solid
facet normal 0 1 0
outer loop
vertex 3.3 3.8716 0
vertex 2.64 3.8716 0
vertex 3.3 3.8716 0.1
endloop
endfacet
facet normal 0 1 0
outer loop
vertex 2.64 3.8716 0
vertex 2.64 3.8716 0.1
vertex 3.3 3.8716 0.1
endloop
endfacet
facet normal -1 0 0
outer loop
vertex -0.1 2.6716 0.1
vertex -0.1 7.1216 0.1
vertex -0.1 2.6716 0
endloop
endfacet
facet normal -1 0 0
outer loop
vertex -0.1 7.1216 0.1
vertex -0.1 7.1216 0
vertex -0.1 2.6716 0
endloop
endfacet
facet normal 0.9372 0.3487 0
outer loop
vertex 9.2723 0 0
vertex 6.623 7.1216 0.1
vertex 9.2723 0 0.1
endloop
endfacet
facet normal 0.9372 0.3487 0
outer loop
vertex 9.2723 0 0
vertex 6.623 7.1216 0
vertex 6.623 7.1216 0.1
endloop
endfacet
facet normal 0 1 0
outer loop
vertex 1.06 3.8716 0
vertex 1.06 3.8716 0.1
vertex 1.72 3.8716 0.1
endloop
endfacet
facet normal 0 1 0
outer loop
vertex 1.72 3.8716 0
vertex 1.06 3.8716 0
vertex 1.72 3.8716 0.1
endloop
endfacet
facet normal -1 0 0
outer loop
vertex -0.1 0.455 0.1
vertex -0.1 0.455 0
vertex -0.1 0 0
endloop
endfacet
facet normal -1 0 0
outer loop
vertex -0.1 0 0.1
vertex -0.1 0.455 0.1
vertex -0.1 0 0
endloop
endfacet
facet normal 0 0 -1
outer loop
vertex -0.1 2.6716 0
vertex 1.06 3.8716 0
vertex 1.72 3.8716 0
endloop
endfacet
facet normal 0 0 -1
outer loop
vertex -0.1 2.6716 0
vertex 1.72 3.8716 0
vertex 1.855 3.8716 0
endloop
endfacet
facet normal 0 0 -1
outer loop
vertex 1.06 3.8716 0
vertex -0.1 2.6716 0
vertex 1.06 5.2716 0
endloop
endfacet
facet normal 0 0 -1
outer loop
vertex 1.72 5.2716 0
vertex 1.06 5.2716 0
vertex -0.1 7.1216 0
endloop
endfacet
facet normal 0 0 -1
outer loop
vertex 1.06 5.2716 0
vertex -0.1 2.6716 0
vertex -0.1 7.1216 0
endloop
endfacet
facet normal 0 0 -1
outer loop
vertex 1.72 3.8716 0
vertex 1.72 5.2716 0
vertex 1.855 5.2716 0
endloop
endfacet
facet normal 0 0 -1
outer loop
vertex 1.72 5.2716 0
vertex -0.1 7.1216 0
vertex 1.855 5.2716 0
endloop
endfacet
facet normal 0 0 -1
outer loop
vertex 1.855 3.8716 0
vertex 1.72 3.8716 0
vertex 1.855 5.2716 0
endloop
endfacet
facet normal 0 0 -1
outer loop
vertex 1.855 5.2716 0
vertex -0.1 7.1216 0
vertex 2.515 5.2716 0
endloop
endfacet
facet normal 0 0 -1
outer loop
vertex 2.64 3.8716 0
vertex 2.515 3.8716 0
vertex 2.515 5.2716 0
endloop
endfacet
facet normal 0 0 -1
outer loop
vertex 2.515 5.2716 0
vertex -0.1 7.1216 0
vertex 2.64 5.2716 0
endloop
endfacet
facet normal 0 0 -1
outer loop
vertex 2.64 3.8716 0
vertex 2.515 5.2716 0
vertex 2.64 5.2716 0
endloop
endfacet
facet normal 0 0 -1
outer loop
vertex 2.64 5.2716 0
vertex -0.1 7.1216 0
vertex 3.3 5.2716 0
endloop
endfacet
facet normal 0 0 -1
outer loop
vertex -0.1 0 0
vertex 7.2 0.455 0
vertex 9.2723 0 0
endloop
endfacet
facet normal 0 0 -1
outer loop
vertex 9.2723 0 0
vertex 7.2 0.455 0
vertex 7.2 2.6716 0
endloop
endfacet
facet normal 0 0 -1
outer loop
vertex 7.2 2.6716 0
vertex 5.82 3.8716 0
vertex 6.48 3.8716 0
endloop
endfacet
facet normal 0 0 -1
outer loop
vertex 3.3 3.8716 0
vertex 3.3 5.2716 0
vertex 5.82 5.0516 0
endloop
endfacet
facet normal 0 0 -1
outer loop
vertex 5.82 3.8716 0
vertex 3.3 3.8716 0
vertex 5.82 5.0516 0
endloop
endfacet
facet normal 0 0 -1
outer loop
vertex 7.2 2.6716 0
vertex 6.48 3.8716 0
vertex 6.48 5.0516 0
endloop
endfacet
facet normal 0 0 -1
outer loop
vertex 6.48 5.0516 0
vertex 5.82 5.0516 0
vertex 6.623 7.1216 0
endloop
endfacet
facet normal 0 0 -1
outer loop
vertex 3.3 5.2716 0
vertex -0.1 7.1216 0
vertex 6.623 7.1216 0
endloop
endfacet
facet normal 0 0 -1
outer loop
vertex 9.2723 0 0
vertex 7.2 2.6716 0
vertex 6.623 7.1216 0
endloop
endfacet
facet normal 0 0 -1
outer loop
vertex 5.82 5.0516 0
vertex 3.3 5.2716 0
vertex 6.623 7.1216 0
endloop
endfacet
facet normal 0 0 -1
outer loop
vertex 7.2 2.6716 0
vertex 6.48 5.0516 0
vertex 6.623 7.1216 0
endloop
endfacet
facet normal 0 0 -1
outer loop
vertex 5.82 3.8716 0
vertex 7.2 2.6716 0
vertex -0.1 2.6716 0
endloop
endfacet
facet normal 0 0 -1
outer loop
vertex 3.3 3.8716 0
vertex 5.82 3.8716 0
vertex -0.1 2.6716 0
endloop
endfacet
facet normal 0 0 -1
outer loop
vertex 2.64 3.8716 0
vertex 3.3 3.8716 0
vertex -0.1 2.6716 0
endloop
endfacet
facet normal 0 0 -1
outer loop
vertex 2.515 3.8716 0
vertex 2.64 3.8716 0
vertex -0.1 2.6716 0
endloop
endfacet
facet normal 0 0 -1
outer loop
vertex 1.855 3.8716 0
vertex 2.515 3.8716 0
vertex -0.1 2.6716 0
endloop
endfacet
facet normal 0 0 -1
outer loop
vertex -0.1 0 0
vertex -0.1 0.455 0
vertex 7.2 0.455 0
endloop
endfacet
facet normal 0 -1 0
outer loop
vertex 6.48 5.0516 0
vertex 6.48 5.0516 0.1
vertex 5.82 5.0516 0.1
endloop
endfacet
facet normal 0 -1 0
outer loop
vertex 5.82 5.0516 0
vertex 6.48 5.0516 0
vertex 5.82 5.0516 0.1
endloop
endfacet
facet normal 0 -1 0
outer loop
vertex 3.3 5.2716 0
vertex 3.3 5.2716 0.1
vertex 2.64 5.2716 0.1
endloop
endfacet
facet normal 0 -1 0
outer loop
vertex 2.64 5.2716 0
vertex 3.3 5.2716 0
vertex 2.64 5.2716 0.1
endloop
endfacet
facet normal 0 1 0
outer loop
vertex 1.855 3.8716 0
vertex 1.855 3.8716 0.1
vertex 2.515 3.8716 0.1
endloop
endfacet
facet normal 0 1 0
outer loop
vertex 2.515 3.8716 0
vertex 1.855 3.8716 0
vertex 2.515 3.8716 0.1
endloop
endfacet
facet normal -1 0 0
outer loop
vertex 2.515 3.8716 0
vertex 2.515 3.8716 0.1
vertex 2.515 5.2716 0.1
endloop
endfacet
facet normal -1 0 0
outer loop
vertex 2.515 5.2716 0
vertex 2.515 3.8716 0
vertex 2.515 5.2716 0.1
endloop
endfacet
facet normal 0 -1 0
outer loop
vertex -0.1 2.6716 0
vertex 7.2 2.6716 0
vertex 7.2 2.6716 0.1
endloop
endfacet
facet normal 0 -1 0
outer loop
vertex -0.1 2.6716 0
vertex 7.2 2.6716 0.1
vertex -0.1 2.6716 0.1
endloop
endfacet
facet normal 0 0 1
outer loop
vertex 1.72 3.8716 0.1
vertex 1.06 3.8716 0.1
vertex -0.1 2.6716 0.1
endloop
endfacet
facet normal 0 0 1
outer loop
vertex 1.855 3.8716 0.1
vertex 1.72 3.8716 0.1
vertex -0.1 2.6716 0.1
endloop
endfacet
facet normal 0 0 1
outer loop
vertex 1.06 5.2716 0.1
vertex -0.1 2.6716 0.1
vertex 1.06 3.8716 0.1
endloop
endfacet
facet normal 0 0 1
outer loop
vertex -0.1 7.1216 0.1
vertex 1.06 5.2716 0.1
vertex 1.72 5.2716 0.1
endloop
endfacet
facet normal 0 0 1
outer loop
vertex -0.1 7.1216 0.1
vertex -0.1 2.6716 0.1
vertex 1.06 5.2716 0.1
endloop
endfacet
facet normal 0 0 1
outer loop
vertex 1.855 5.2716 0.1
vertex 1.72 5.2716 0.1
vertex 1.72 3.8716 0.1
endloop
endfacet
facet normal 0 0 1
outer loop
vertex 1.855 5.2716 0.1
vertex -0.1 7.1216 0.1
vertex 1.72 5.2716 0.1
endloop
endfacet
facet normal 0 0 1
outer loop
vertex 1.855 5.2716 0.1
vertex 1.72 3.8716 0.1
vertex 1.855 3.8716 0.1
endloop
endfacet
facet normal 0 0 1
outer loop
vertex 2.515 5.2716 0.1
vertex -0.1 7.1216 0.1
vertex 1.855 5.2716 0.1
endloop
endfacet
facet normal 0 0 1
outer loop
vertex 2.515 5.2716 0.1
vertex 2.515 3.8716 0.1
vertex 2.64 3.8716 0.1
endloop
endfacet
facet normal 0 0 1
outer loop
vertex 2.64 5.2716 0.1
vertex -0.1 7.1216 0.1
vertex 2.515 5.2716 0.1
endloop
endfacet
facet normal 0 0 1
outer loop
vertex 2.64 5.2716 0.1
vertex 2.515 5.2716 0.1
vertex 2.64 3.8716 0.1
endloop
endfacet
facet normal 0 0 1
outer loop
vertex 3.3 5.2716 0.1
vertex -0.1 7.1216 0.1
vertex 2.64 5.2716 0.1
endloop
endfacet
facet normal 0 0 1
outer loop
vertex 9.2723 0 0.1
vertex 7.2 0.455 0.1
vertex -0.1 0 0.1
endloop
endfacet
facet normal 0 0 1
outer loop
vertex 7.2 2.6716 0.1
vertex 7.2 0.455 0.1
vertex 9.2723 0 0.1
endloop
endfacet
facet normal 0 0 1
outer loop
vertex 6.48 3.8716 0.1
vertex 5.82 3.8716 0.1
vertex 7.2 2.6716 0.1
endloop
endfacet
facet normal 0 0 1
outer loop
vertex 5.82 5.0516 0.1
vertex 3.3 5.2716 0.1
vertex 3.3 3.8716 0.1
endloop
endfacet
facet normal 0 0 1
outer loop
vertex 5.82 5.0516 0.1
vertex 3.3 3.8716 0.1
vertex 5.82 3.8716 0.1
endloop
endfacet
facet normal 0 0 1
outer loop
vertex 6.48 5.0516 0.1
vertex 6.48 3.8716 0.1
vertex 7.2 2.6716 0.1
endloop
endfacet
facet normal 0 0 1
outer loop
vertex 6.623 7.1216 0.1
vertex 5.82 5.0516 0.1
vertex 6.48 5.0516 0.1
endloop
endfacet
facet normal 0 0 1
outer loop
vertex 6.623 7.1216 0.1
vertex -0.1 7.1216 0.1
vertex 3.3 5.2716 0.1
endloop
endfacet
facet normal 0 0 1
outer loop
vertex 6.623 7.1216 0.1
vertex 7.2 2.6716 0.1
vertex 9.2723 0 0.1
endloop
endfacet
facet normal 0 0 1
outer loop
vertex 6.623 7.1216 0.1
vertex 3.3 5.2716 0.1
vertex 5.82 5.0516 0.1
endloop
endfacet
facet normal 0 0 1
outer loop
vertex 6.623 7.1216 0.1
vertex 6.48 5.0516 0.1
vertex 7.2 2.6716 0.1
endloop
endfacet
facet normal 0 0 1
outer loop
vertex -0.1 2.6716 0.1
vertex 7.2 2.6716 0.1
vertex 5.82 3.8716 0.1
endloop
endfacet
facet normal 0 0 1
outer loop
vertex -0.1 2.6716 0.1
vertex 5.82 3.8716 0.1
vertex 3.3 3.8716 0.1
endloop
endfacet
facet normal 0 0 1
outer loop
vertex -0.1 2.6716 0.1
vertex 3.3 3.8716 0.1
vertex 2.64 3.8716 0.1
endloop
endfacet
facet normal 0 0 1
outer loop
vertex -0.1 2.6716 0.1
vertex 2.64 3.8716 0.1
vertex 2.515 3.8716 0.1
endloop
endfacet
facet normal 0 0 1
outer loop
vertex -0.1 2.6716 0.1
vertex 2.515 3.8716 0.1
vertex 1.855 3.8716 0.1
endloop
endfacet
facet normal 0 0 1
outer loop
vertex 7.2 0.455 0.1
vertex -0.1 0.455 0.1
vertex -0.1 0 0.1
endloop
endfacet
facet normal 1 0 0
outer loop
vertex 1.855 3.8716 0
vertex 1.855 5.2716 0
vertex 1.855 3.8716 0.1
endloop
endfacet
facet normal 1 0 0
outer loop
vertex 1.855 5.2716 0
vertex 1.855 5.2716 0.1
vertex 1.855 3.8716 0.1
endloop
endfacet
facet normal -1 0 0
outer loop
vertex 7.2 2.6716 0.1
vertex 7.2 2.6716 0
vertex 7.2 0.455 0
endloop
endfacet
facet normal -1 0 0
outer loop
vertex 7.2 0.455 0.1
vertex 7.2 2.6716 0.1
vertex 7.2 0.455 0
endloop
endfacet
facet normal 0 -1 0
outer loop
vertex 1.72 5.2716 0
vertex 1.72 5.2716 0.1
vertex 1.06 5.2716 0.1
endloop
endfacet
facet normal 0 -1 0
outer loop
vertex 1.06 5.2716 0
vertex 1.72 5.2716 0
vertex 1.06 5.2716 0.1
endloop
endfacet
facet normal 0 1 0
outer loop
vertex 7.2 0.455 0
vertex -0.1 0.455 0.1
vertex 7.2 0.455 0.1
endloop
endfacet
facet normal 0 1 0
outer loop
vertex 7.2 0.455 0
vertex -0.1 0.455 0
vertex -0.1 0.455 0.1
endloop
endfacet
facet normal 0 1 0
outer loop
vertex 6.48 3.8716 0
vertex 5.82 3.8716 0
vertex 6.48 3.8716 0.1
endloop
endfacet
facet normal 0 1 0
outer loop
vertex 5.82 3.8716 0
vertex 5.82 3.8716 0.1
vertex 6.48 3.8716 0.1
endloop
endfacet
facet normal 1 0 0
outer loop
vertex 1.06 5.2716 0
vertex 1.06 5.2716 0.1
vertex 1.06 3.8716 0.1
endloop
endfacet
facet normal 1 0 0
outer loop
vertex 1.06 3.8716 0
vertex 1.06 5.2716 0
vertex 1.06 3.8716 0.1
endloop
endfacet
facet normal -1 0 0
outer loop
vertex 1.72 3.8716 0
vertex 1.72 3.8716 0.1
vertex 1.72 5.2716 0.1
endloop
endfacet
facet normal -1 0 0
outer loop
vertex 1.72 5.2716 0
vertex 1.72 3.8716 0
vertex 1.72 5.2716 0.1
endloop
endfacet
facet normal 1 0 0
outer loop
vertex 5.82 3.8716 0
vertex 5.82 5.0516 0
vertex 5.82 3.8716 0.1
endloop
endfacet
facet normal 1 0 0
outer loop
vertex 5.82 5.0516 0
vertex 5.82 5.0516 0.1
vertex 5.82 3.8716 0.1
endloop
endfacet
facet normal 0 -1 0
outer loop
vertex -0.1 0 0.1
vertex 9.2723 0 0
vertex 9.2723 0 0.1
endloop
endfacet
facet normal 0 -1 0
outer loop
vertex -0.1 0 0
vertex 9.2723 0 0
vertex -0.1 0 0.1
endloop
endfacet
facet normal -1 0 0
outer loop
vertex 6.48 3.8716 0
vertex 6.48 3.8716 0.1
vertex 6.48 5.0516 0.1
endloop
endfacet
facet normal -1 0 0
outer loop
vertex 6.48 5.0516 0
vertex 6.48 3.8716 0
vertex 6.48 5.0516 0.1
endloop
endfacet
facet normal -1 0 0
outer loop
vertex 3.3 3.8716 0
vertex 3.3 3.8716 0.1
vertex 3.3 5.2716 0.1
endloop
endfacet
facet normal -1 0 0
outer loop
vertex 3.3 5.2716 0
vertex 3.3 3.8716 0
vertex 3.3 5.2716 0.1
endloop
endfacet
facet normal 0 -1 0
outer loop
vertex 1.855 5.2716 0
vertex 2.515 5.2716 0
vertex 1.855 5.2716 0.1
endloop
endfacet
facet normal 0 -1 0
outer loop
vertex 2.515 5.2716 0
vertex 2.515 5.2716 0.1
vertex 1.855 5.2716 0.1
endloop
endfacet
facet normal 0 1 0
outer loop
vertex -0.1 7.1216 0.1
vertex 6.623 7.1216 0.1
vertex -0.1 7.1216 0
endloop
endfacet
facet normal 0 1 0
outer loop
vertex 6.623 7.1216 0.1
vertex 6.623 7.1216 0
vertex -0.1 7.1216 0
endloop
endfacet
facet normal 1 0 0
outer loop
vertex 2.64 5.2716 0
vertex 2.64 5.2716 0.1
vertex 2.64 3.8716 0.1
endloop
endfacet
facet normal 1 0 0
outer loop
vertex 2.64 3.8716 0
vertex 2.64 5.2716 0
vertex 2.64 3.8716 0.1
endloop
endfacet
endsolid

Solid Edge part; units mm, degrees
sketch "Sketch1" plane through (0, 0, 0) normal (0, 0, 1) x (1, 0, 0)
  line L0 (-0.1, 7.1216) -> (-0.1, 2.6716)
  line L1 (7.2, 2.6716) -> (-0.1, 2.6716)
  line L2 (7.2, 2.6716) -> (7.2, 0.455)
  line L3 (-0.1, 0.455) -> (7.2, 0.455)
  line L4 (-0.1, 0.455) -> (-0.1, 0)
  line L5 (9.2723, 0) -> (-0.1, 0)
  line L6 (6.623, 7.1216) -> (9.2723, 0)
  line L7 (6.623, 7.1216) -> (-0.1, 7.1216)
  dimension "D1" = 0.455
  dimension "D2" = 4.45
  dimension "D3" = 7.3
extrude "Protrusion1" add sketch "Sketch1" along normal blind 0.1
sketch "Sketch2" plane through (4.6037, 3.5608, 0.1) normal (0, 0, 1) x (1, 0, 0)
  line L0 (-2.7487, 0.3108) -> (-2.0887, 0.3108)
  line L1 (-2.0887, 0.3108) -> (-2.0887, 1.7108)
  line L2 (-2.0887, 1.7108) -> (-2.7487, 1.7108)
  line L3 (-2.7487, 1.7108) -> (-2.7487, 0.3108)
  line L4 (-1.9637, 0.3108) -> (-1.3037, 0.3108)
  line L5 (-1.3037, 0.3108) -> (-1.3037, 1.7108)
  line L6 (-1.3037, 1.7108) -> (-1.9637, 1.7108)
  line L7 (-1.9637, 1.7108) -> (-1.9637, 0.3108)
  line L8 (1.2163, 0.3108) -> (1.8763, 0.3108)
  line L9 (1.8763, 0.3108) -> (1.8763, 1.4908)
  line L10 (1.8763, 1.4908) -> (1.2163, 1.4908)
  line L11 (1.2163, 1.4908) -> (1.2163, 0.3108)
  line L12 (-3.5437, 0.3108) -> (-2.8837, 0.3108)
  line L13 (-2.8837, 0.3108) -> (-2.8837, 1.7108)
  line L14 (-2.8837, 1.7108) -> (-3.5437, 1.7108)
  line L15 (-3.5437, 1.7108) -> (-3.5437, 0.3108)
  dimension "D1" = 2.8837
  dimension "D2" = 3.5437
  dimension "D3" = 1.2163
extrude "Cutout1" cut sketch "Sketch2" against normal through all
